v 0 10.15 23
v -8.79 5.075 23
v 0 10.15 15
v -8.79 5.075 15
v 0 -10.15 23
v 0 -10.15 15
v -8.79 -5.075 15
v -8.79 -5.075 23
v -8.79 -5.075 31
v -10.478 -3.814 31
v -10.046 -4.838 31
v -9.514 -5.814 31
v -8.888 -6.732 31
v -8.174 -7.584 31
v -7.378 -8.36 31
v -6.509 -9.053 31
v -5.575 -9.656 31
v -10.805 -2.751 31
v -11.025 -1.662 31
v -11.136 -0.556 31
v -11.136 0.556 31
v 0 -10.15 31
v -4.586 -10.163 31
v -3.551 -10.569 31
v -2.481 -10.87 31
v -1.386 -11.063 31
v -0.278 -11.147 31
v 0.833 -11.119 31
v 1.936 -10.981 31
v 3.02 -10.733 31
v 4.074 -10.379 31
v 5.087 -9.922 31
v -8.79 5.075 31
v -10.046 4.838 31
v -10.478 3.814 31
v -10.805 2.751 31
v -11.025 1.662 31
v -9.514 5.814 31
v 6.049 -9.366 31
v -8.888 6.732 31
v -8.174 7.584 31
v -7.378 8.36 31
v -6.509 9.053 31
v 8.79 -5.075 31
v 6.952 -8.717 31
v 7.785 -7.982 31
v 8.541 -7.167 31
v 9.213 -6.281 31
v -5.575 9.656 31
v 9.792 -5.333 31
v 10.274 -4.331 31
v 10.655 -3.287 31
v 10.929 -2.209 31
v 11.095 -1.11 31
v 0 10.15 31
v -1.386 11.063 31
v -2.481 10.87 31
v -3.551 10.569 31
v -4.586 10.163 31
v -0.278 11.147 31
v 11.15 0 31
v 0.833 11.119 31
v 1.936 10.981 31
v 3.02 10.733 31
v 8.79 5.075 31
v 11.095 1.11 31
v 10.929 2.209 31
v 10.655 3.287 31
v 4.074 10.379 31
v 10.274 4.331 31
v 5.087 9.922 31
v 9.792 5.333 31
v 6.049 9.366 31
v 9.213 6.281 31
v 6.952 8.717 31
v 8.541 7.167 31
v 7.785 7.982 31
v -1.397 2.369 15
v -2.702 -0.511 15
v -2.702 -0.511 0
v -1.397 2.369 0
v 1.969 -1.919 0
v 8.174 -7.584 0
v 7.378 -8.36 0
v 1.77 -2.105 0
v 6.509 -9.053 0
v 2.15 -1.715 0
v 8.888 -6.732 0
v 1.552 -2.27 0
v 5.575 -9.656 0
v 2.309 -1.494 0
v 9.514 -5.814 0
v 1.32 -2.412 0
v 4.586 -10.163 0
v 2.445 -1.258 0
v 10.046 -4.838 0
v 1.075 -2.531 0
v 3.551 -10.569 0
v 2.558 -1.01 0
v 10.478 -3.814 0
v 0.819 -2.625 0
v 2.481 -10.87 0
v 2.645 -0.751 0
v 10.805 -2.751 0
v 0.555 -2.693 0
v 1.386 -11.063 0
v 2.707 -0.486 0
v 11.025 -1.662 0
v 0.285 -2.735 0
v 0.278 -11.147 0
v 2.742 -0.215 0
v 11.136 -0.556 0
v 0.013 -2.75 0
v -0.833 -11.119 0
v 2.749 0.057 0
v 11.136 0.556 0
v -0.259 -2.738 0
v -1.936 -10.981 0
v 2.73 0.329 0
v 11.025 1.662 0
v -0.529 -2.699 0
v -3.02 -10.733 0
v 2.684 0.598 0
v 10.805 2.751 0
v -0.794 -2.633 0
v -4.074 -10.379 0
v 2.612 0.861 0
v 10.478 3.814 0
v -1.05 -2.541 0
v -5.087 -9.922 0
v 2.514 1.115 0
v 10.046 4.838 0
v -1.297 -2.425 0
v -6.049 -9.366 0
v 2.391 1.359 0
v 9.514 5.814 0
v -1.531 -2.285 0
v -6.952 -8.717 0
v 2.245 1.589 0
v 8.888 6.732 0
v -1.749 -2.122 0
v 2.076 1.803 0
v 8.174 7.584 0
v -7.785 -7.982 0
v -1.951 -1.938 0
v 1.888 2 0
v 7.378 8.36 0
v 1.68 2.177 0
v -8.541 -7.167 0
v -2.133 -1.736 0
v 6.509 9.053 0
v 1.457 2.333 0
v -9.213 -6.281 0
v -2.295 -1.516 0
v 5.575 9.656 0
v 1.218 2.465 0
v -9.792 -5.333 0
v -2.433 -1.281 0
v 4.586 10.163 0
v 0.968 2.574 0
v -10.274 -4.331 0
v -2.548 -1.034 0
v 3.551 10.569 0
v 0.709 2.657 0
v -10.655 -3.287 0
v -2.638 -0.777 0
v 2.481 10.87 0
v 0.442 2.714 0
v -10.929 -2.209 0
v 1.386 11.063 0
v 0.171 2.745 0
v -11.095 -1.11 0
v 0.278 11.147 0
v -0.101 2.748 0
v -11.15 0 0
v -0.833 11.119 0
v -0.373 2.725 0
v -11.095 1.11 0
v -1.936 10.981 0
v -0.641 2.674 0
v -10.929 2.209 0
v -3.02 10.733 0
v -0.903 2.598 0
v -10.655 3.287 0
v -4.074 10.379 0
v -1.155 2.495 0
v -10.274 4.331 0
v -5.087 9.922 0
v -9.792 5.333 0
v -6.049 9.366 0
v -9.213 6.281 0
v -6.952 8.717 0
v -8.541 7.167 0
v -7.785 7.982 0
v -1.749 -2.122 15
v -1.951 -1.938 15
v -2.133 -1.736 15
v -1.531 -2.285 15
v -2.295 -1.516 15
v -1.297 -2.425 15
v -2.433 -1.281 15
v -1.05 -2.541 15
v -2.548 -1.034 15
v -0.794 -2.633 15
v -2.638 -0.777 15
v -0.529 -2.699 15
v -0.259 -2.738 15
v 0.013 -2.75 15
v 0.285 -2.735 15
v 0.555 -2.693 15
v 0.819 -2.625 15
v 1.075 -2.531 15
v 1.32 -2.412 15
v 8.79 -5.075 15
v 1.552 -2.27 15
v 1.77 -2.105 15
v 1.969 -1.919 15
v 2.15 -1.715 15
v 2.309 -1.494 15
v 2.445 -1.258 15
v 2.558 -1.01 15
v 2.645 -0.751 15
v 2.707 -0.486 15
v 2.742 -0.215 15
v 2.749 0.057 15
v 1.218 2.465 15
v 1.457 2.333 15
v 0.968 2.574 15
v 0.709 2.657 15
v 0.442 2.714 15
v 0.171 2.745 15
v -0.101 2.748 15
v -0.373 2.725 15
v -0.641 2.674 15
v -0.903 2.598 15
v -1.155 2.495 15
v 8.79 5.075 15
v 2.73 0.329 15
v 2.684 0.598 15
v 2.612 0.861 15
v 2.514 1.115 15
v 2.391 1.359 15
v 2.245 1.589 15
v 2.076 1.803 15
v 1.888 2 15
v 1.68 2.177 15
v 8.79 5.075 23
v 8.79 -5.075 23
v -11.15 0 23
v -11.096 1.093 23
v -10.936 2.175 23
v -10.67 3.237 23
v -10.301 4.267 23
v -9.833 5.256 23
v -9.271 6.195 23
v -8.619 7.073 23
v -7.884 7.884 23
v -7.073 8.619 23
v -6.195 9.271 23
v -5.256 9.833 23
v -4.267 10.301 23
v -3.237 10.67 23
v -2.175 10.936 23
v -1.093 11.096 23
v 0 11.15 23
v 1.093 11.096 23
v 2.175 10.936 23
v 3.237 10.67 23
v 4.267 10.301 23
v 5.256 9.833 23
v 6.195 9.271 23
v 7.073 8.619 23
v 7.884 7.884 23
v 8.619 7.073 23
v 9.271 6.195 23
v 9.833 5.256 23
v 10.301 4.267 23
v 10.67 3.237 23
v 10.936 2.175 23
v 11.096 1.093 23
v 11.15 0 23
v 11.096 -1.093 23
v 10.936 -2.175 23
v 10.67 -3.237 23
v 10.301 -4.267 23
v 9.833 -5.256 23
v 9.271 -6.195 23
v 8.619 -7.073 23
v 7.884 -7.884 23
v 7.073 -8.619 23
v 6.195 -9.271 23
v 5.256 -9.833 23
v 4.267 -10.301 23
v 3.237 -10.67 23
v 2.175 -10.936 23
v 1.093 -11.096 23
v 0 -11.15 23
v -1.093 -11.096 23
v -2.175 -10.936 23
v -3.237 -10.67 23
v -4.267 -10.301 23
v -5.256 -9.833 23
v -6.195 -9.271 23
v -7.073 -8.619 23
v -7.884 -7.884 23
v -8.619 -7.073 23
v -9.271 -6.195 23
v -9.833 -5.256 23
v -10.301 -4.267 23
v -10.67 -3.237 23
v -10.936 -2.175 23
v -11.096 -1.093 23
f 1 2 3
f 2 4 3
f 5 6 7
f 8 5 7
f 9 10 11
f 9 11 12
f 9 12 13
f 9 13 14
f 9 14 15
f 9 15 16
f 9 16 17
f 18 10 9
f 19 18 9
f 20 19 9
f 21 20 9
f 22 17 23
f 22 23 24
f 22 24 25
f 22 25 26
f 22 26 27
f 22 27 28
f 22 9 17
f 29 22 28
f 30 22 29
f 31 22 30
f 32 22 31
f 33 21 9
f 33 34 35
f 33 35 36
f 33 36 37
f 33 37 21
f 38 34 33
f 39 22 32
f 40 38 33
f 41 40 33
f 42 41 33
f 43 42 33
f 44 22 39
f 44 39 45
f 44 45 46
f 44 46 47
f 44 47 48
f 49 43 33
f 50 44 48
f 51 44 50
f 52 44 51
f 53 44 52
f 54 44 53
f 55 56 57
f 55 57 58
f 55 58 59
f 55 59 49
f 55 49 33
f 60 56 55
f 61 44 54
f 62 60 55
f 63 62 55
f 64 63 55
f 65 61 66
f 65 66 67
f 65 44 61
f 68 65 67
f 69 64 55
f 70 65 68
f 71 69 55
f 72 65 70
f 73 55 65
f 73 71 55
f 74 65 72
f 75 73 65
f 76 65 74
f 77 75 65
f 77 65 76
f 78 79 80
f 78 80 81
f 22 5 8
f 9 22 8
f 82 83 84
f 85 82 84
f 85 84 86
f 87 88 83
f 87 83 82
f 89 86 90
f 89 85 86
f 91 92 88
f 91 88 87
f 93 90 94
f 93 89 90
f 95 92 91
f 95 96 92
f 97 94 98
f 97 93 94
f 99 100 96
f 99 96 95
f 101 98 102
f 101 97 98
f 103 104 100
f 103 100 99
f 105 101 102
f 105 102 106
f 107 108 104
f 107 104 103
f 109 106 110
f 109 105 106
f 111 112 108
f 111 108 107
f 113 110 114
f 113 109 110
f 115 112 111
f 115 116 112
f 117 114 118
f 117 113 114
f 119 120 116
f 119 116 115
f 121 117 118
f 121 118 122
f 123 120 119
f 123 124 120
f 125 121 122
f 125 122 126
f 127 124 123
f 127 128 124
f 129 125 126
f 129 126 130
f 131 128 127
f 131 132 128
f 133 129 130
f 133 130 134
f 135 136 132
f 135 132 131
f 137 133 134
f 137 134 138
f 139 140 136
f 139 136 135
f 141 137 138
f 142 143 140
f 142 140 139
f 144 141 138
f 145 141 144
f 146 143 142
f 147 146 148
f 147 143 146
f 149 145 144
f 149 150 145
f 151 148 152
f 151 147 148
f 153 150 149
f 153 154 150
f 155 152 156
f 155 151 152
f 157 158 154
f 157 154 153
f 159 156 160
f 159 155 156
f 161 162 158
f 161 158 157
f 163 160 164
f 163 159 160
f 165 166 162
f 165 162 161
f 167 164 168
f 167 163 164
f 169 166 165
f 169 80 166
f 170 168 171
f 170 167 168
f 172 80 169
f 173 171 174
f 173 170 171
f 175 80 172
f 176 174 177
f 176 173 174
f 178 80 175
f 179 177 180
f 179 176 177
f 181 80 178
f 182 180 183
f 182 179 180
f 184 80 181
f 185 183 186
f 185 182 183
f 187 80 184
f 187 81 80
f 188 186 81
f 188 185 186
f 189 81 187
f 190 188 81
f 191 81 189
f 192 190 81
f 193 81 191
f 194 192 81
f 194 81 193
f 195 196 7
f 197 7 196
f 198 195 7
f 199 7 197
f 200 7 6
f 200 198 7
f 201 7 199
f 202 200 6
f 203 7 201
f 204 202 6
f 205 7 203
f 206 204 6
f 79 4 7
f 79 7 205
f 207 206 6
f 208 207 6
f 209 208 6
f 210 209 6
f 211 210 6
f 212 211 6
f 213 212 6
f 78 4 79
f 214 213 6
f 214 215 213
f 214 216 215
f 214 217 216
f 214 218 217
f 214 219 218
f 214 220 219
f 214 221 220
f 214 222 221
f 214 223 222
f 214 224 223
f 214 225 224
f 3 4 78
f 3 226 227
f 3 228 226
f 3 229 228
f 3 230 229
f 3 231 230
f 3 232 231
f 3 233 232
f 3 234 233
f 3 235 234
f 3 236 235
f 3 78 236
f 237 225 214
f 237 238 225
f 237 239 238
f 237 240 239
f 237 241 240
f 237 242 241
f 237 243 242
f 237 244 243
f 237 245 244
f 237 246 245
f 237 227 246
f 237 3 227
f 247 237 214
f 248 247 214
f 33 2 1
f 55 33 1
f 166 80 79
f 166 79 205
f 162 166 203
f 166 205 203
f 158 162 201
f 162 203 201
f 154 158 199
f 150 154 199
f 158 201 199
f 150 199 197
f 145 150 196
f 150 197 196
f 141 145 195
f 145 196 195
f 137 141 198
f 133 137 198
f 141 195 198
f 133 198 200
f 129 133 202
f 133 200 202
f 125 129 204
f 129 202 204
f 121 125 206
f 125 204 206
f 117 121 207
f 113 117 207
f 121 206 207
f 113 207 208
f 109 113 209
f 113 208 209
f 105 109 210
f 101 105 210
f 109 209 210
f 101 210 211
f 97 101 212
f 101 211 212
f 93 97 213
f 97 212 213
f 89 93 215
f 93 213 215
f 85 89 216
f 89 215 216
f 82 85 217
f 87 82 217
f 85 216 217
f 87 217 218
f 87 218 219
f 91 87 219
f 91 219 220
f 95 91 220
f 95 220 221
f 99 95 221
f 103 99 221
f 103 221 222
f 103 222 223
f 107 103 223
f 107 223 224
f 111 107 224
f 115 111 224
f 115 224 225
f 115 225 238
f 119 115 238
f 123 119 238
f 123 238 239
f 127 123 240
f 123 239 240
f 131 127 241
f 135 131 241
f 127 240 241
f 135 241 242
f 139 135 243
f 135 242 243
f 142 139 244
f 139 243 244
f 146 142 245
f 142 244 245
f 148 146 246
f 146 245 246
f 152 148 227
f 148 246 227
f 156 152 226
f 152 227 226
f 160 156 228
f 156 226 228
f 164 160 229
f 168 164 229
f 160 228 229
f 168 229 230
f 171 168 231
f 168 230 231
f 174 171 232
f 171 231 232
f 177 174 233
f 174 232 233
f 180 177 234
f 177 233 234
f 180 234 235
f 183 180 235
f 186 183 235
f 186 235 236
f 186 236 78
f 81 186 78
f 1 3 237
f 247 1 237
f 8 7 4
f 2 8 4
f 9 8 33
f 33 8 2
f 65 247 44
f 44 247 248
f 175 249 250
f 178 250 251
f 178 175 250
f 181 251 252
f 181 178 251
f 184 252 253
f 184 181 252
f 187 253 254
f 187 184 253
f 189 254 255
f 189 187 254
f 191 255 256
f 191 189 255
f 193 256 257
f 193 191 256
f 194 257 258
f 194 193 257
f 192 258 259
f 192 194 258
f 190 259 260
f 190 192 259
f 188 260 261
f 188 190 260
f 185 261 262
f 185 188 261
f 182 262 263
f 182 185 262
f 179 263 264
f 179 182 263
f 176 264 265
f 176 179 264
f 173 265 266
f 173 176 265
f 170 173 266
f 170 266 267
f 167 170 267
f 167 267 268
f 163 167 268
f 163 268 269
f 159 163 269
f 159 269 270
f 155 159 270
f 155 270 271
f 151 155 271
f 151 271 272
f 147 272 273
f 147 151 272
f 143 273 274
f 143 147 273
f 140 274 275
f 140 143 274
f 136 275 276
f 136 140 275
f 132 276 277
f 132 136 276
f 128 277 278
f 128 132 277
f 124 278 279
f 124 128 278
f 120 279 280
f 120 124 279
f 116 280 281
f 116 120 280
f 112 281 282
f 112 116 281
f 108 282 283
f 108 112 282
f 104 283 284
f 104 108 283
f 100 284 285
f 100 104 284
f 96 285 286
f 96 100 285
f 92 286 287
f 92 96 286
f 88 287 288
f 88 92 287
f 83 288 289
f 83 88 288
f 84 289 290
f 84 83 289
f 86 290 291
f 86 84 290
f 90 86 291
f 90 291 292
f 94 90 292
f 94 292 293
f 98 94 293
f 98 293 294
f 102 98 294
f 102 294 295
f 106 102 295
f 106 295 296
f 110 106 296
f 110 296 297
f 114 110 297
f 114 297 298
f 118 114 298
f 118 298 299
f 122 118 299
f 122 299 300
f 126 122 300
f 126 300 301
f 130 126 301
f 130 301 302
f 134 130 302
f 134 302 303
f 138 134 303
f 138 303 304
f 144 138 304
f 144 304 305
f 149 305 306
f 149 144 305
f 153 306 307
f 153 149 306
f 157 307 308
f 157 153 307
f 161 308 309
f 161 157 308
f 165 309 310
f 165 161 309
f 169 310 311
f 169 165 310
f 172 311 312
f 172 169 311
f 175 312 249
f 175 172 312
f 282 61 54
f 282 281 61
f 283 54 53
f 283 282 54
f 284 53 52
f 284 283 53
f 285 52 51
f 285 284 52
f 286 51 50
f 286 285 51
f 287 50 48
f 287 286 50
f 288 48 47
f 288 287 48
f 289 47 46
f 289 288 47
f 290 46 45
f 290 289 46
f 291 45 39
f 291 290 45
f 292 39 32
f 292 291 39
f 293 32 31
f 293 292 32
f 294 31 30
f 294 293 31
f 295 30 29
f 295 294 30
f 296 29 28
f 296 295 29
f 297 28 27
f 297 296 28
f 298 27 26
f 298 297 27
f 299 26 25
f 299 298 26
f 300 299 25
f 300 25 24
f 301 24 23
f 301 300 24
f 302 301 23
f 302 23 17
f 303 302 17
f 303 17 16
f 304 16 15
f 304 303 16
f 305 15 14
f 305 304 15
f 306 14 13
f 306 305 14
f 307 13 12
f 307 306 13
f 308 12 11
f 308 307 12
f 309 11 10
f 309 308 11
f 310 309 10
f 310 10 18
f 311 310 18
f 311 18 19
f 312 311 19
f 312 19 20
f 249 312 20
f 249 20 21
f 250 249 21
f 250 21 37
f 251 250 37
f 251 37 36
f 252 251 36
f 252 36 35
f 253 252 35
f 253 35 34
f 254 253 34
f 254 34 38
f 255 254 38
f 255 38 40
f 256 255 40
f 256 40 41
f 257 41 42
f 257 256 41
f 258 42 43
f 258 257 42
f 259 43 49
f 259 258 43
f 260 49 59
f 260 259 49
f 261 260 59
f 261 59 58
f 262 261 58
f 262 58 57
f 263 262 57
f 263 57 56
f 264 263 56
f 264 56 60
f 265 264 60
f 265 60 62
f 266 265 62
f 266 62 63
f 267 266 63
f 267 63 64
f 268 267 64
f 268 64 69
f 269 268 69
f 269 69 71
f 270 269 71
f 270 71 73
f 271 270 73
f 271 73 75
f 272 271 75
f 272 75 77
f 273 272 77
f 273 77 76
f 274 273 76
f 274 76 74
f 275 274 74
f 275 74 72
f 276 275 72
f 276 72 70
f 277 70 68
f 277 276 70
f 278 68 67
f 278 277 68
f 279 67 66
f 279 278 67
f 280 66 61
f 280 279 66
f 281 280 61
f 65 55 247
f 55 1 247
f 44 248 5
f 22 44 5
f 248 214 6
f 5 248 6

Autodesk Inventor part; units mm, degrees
ref_plane "YZ Plane" through (0, 0, 0) normal (1, 0, 0) x (0, 1, 0)
ref_plane "XZ Plane" through (0, 0, 0) normal (0, 1, 0) x (-1, 0, 0)
sketch "Sketch1" plane through (0, 0, 0) normal (0, 0, 1) x (1, 0, 0)
  line L0 (-2.4408, -0.5408) -> (-1.2026, 2.1918) projected
  arc A0 (-2.4408, -0.5408) -> (-1.2026, 2.1918) centre (0, 0) ccw projected
  circle A1 centre (0, 0) radius 3.5
  line L1 (-3.6608, -0.2297) -> (-3.4925, -0.2297)
  line L2 (-3.4925, 0.2297) -> (-3.6608, 0.2297)
  line L3 (-3.6608, 0.2297) -> (-3.6608, -0.2297)
  line L4 (-3.6608, -0.2297) -> (-3.5, 0) construction
  line L5 (-3.5, 0) -> (-3.6608, 0.2297) construction
  point P0 (0, 0)
  dimension "d0" = 7
ref_plane "Work Plane1" through (-2, -2, 15) normal (0, 0, 1) x (1, 0, 0)
extrude "Extrusion1" add sketch "Sketch1" along normal up to surface (15 mm away) contours A1
sketch "Sketch2" plane through (0, 0, 15) normal (0, 0, 1) x (1, 0, 0)
  arc A0 (-2.4408, -0.5408) -> (-1.2026, 2.1918) centre (0, 0) ccw projected
  line L0 (-1.2026, 2.1918) -> (-2.4408, -0.5408) projected
  circle A1 centre (0, 0) radius 3.5 projected
  arc A2 (-2.702, -0.5115) -> (-1.3968, 2.3688) centre (0, 0) ccw
  line L1 (-2.702, -0.5115) -> (-1.3968, 2.3688)
  point P0 (0, 0)
  dimension "d9" = 0.25
extrude "Extrusion2" cut sketch "Sketch2" against normal up to surface (15 mm away) contours L1 A2
sketch "Sketch6" plane through (0, 0, 15) normal (0, 0, 1) x (1, 0, 0)
  circle A0 centre (0, 0) radius 10.15
  line L0 (0, 10.15) -> (8.7902, 5.075)
  line L1 (8.7902, 5.075) -> (8.7902, -5.075)
  line L2 (8.7902, -5.075) -> (0, -10.15)
  line L3 (0, -10.15) -> (-8.7902, -5.075)
  line L4 (-8.7902, -5.075) -> (-8.7902, 5.075)
  line L5 (-8.7902, 5.075) -> (0, 10.15)
  arc A1 (-2.702, -0.5115) -> (-1.3968, 2.3688) centre (0, 0) ccw projected
  line L6 (-1.3968, 2.3688) -> (-2.702, -0.5115) projected
  circle A2 centre (0, 0) radius 3.5 projected
  point P0 (0, -10.15)
  point P1 (0, -10.15)
  dimension "d20" = 20.3
extrude "Extrusion5" add sketch "Sketch6" along normal blind 8 contours A0 L1 | L0 A0 | A0 L2 | L5 A0 | A0 L3 | L4 A0
extrude "Extrusion6" add sketch "Sketch6" against normal up to surface (15 mm away) contours A0 L1 | L0 A0 | L1 L2 L3 L4 L5 L0 | A0 L2 | L5 A0 | A0 L3 | L4 A0
sketch "Sketch7" plane through (0, 0, 0) normal (0, 0, -1) x (-1, 0, 0)
  circle A0 centre (0, 0) radius 10.15 projected
  arc A1 (1.3968, 2.3688) -> (2.702, -0.5115) centre (0, 0) ccw projected
  line L0 (1.3968, 2.3688) -> (2.702, -0.5115) projected
  circle A2 centre (0, 0) radius 11.15
  dimension "d25" = 1
extrude "Extrusion7" add sketch "Sketch7" against normal up to surface (23 mm away) contours A2
sketch "Sketch8" plane through (0, 0, 23) normal (0, 0, 1) x (1, 0, 0)
  circle A0 centre (0, 0) radius 11.15 projected
  line L0 (-8.7902, -5.075) -> (-8.7902, 5.075) projected
  line L1 (-8.7902, 5.075) -> (0, 10.15) projected
  line L2 (0, 10.15) -> (8.7902, 5.075) projected
  line L3 (8.7902, 5.075) -> (8.7902, -5.075) projected
  line L4 (8.7902, -5.075) -> (0, -10.15) projected
  line L5 (0, -10.15) -> (-8.7902, -5.075) projected
  point P0 (0, 0)
extrude "Extrusion8" add sketch "Sketch8" along normal blind 8
properties part number "RodMotorMount"
